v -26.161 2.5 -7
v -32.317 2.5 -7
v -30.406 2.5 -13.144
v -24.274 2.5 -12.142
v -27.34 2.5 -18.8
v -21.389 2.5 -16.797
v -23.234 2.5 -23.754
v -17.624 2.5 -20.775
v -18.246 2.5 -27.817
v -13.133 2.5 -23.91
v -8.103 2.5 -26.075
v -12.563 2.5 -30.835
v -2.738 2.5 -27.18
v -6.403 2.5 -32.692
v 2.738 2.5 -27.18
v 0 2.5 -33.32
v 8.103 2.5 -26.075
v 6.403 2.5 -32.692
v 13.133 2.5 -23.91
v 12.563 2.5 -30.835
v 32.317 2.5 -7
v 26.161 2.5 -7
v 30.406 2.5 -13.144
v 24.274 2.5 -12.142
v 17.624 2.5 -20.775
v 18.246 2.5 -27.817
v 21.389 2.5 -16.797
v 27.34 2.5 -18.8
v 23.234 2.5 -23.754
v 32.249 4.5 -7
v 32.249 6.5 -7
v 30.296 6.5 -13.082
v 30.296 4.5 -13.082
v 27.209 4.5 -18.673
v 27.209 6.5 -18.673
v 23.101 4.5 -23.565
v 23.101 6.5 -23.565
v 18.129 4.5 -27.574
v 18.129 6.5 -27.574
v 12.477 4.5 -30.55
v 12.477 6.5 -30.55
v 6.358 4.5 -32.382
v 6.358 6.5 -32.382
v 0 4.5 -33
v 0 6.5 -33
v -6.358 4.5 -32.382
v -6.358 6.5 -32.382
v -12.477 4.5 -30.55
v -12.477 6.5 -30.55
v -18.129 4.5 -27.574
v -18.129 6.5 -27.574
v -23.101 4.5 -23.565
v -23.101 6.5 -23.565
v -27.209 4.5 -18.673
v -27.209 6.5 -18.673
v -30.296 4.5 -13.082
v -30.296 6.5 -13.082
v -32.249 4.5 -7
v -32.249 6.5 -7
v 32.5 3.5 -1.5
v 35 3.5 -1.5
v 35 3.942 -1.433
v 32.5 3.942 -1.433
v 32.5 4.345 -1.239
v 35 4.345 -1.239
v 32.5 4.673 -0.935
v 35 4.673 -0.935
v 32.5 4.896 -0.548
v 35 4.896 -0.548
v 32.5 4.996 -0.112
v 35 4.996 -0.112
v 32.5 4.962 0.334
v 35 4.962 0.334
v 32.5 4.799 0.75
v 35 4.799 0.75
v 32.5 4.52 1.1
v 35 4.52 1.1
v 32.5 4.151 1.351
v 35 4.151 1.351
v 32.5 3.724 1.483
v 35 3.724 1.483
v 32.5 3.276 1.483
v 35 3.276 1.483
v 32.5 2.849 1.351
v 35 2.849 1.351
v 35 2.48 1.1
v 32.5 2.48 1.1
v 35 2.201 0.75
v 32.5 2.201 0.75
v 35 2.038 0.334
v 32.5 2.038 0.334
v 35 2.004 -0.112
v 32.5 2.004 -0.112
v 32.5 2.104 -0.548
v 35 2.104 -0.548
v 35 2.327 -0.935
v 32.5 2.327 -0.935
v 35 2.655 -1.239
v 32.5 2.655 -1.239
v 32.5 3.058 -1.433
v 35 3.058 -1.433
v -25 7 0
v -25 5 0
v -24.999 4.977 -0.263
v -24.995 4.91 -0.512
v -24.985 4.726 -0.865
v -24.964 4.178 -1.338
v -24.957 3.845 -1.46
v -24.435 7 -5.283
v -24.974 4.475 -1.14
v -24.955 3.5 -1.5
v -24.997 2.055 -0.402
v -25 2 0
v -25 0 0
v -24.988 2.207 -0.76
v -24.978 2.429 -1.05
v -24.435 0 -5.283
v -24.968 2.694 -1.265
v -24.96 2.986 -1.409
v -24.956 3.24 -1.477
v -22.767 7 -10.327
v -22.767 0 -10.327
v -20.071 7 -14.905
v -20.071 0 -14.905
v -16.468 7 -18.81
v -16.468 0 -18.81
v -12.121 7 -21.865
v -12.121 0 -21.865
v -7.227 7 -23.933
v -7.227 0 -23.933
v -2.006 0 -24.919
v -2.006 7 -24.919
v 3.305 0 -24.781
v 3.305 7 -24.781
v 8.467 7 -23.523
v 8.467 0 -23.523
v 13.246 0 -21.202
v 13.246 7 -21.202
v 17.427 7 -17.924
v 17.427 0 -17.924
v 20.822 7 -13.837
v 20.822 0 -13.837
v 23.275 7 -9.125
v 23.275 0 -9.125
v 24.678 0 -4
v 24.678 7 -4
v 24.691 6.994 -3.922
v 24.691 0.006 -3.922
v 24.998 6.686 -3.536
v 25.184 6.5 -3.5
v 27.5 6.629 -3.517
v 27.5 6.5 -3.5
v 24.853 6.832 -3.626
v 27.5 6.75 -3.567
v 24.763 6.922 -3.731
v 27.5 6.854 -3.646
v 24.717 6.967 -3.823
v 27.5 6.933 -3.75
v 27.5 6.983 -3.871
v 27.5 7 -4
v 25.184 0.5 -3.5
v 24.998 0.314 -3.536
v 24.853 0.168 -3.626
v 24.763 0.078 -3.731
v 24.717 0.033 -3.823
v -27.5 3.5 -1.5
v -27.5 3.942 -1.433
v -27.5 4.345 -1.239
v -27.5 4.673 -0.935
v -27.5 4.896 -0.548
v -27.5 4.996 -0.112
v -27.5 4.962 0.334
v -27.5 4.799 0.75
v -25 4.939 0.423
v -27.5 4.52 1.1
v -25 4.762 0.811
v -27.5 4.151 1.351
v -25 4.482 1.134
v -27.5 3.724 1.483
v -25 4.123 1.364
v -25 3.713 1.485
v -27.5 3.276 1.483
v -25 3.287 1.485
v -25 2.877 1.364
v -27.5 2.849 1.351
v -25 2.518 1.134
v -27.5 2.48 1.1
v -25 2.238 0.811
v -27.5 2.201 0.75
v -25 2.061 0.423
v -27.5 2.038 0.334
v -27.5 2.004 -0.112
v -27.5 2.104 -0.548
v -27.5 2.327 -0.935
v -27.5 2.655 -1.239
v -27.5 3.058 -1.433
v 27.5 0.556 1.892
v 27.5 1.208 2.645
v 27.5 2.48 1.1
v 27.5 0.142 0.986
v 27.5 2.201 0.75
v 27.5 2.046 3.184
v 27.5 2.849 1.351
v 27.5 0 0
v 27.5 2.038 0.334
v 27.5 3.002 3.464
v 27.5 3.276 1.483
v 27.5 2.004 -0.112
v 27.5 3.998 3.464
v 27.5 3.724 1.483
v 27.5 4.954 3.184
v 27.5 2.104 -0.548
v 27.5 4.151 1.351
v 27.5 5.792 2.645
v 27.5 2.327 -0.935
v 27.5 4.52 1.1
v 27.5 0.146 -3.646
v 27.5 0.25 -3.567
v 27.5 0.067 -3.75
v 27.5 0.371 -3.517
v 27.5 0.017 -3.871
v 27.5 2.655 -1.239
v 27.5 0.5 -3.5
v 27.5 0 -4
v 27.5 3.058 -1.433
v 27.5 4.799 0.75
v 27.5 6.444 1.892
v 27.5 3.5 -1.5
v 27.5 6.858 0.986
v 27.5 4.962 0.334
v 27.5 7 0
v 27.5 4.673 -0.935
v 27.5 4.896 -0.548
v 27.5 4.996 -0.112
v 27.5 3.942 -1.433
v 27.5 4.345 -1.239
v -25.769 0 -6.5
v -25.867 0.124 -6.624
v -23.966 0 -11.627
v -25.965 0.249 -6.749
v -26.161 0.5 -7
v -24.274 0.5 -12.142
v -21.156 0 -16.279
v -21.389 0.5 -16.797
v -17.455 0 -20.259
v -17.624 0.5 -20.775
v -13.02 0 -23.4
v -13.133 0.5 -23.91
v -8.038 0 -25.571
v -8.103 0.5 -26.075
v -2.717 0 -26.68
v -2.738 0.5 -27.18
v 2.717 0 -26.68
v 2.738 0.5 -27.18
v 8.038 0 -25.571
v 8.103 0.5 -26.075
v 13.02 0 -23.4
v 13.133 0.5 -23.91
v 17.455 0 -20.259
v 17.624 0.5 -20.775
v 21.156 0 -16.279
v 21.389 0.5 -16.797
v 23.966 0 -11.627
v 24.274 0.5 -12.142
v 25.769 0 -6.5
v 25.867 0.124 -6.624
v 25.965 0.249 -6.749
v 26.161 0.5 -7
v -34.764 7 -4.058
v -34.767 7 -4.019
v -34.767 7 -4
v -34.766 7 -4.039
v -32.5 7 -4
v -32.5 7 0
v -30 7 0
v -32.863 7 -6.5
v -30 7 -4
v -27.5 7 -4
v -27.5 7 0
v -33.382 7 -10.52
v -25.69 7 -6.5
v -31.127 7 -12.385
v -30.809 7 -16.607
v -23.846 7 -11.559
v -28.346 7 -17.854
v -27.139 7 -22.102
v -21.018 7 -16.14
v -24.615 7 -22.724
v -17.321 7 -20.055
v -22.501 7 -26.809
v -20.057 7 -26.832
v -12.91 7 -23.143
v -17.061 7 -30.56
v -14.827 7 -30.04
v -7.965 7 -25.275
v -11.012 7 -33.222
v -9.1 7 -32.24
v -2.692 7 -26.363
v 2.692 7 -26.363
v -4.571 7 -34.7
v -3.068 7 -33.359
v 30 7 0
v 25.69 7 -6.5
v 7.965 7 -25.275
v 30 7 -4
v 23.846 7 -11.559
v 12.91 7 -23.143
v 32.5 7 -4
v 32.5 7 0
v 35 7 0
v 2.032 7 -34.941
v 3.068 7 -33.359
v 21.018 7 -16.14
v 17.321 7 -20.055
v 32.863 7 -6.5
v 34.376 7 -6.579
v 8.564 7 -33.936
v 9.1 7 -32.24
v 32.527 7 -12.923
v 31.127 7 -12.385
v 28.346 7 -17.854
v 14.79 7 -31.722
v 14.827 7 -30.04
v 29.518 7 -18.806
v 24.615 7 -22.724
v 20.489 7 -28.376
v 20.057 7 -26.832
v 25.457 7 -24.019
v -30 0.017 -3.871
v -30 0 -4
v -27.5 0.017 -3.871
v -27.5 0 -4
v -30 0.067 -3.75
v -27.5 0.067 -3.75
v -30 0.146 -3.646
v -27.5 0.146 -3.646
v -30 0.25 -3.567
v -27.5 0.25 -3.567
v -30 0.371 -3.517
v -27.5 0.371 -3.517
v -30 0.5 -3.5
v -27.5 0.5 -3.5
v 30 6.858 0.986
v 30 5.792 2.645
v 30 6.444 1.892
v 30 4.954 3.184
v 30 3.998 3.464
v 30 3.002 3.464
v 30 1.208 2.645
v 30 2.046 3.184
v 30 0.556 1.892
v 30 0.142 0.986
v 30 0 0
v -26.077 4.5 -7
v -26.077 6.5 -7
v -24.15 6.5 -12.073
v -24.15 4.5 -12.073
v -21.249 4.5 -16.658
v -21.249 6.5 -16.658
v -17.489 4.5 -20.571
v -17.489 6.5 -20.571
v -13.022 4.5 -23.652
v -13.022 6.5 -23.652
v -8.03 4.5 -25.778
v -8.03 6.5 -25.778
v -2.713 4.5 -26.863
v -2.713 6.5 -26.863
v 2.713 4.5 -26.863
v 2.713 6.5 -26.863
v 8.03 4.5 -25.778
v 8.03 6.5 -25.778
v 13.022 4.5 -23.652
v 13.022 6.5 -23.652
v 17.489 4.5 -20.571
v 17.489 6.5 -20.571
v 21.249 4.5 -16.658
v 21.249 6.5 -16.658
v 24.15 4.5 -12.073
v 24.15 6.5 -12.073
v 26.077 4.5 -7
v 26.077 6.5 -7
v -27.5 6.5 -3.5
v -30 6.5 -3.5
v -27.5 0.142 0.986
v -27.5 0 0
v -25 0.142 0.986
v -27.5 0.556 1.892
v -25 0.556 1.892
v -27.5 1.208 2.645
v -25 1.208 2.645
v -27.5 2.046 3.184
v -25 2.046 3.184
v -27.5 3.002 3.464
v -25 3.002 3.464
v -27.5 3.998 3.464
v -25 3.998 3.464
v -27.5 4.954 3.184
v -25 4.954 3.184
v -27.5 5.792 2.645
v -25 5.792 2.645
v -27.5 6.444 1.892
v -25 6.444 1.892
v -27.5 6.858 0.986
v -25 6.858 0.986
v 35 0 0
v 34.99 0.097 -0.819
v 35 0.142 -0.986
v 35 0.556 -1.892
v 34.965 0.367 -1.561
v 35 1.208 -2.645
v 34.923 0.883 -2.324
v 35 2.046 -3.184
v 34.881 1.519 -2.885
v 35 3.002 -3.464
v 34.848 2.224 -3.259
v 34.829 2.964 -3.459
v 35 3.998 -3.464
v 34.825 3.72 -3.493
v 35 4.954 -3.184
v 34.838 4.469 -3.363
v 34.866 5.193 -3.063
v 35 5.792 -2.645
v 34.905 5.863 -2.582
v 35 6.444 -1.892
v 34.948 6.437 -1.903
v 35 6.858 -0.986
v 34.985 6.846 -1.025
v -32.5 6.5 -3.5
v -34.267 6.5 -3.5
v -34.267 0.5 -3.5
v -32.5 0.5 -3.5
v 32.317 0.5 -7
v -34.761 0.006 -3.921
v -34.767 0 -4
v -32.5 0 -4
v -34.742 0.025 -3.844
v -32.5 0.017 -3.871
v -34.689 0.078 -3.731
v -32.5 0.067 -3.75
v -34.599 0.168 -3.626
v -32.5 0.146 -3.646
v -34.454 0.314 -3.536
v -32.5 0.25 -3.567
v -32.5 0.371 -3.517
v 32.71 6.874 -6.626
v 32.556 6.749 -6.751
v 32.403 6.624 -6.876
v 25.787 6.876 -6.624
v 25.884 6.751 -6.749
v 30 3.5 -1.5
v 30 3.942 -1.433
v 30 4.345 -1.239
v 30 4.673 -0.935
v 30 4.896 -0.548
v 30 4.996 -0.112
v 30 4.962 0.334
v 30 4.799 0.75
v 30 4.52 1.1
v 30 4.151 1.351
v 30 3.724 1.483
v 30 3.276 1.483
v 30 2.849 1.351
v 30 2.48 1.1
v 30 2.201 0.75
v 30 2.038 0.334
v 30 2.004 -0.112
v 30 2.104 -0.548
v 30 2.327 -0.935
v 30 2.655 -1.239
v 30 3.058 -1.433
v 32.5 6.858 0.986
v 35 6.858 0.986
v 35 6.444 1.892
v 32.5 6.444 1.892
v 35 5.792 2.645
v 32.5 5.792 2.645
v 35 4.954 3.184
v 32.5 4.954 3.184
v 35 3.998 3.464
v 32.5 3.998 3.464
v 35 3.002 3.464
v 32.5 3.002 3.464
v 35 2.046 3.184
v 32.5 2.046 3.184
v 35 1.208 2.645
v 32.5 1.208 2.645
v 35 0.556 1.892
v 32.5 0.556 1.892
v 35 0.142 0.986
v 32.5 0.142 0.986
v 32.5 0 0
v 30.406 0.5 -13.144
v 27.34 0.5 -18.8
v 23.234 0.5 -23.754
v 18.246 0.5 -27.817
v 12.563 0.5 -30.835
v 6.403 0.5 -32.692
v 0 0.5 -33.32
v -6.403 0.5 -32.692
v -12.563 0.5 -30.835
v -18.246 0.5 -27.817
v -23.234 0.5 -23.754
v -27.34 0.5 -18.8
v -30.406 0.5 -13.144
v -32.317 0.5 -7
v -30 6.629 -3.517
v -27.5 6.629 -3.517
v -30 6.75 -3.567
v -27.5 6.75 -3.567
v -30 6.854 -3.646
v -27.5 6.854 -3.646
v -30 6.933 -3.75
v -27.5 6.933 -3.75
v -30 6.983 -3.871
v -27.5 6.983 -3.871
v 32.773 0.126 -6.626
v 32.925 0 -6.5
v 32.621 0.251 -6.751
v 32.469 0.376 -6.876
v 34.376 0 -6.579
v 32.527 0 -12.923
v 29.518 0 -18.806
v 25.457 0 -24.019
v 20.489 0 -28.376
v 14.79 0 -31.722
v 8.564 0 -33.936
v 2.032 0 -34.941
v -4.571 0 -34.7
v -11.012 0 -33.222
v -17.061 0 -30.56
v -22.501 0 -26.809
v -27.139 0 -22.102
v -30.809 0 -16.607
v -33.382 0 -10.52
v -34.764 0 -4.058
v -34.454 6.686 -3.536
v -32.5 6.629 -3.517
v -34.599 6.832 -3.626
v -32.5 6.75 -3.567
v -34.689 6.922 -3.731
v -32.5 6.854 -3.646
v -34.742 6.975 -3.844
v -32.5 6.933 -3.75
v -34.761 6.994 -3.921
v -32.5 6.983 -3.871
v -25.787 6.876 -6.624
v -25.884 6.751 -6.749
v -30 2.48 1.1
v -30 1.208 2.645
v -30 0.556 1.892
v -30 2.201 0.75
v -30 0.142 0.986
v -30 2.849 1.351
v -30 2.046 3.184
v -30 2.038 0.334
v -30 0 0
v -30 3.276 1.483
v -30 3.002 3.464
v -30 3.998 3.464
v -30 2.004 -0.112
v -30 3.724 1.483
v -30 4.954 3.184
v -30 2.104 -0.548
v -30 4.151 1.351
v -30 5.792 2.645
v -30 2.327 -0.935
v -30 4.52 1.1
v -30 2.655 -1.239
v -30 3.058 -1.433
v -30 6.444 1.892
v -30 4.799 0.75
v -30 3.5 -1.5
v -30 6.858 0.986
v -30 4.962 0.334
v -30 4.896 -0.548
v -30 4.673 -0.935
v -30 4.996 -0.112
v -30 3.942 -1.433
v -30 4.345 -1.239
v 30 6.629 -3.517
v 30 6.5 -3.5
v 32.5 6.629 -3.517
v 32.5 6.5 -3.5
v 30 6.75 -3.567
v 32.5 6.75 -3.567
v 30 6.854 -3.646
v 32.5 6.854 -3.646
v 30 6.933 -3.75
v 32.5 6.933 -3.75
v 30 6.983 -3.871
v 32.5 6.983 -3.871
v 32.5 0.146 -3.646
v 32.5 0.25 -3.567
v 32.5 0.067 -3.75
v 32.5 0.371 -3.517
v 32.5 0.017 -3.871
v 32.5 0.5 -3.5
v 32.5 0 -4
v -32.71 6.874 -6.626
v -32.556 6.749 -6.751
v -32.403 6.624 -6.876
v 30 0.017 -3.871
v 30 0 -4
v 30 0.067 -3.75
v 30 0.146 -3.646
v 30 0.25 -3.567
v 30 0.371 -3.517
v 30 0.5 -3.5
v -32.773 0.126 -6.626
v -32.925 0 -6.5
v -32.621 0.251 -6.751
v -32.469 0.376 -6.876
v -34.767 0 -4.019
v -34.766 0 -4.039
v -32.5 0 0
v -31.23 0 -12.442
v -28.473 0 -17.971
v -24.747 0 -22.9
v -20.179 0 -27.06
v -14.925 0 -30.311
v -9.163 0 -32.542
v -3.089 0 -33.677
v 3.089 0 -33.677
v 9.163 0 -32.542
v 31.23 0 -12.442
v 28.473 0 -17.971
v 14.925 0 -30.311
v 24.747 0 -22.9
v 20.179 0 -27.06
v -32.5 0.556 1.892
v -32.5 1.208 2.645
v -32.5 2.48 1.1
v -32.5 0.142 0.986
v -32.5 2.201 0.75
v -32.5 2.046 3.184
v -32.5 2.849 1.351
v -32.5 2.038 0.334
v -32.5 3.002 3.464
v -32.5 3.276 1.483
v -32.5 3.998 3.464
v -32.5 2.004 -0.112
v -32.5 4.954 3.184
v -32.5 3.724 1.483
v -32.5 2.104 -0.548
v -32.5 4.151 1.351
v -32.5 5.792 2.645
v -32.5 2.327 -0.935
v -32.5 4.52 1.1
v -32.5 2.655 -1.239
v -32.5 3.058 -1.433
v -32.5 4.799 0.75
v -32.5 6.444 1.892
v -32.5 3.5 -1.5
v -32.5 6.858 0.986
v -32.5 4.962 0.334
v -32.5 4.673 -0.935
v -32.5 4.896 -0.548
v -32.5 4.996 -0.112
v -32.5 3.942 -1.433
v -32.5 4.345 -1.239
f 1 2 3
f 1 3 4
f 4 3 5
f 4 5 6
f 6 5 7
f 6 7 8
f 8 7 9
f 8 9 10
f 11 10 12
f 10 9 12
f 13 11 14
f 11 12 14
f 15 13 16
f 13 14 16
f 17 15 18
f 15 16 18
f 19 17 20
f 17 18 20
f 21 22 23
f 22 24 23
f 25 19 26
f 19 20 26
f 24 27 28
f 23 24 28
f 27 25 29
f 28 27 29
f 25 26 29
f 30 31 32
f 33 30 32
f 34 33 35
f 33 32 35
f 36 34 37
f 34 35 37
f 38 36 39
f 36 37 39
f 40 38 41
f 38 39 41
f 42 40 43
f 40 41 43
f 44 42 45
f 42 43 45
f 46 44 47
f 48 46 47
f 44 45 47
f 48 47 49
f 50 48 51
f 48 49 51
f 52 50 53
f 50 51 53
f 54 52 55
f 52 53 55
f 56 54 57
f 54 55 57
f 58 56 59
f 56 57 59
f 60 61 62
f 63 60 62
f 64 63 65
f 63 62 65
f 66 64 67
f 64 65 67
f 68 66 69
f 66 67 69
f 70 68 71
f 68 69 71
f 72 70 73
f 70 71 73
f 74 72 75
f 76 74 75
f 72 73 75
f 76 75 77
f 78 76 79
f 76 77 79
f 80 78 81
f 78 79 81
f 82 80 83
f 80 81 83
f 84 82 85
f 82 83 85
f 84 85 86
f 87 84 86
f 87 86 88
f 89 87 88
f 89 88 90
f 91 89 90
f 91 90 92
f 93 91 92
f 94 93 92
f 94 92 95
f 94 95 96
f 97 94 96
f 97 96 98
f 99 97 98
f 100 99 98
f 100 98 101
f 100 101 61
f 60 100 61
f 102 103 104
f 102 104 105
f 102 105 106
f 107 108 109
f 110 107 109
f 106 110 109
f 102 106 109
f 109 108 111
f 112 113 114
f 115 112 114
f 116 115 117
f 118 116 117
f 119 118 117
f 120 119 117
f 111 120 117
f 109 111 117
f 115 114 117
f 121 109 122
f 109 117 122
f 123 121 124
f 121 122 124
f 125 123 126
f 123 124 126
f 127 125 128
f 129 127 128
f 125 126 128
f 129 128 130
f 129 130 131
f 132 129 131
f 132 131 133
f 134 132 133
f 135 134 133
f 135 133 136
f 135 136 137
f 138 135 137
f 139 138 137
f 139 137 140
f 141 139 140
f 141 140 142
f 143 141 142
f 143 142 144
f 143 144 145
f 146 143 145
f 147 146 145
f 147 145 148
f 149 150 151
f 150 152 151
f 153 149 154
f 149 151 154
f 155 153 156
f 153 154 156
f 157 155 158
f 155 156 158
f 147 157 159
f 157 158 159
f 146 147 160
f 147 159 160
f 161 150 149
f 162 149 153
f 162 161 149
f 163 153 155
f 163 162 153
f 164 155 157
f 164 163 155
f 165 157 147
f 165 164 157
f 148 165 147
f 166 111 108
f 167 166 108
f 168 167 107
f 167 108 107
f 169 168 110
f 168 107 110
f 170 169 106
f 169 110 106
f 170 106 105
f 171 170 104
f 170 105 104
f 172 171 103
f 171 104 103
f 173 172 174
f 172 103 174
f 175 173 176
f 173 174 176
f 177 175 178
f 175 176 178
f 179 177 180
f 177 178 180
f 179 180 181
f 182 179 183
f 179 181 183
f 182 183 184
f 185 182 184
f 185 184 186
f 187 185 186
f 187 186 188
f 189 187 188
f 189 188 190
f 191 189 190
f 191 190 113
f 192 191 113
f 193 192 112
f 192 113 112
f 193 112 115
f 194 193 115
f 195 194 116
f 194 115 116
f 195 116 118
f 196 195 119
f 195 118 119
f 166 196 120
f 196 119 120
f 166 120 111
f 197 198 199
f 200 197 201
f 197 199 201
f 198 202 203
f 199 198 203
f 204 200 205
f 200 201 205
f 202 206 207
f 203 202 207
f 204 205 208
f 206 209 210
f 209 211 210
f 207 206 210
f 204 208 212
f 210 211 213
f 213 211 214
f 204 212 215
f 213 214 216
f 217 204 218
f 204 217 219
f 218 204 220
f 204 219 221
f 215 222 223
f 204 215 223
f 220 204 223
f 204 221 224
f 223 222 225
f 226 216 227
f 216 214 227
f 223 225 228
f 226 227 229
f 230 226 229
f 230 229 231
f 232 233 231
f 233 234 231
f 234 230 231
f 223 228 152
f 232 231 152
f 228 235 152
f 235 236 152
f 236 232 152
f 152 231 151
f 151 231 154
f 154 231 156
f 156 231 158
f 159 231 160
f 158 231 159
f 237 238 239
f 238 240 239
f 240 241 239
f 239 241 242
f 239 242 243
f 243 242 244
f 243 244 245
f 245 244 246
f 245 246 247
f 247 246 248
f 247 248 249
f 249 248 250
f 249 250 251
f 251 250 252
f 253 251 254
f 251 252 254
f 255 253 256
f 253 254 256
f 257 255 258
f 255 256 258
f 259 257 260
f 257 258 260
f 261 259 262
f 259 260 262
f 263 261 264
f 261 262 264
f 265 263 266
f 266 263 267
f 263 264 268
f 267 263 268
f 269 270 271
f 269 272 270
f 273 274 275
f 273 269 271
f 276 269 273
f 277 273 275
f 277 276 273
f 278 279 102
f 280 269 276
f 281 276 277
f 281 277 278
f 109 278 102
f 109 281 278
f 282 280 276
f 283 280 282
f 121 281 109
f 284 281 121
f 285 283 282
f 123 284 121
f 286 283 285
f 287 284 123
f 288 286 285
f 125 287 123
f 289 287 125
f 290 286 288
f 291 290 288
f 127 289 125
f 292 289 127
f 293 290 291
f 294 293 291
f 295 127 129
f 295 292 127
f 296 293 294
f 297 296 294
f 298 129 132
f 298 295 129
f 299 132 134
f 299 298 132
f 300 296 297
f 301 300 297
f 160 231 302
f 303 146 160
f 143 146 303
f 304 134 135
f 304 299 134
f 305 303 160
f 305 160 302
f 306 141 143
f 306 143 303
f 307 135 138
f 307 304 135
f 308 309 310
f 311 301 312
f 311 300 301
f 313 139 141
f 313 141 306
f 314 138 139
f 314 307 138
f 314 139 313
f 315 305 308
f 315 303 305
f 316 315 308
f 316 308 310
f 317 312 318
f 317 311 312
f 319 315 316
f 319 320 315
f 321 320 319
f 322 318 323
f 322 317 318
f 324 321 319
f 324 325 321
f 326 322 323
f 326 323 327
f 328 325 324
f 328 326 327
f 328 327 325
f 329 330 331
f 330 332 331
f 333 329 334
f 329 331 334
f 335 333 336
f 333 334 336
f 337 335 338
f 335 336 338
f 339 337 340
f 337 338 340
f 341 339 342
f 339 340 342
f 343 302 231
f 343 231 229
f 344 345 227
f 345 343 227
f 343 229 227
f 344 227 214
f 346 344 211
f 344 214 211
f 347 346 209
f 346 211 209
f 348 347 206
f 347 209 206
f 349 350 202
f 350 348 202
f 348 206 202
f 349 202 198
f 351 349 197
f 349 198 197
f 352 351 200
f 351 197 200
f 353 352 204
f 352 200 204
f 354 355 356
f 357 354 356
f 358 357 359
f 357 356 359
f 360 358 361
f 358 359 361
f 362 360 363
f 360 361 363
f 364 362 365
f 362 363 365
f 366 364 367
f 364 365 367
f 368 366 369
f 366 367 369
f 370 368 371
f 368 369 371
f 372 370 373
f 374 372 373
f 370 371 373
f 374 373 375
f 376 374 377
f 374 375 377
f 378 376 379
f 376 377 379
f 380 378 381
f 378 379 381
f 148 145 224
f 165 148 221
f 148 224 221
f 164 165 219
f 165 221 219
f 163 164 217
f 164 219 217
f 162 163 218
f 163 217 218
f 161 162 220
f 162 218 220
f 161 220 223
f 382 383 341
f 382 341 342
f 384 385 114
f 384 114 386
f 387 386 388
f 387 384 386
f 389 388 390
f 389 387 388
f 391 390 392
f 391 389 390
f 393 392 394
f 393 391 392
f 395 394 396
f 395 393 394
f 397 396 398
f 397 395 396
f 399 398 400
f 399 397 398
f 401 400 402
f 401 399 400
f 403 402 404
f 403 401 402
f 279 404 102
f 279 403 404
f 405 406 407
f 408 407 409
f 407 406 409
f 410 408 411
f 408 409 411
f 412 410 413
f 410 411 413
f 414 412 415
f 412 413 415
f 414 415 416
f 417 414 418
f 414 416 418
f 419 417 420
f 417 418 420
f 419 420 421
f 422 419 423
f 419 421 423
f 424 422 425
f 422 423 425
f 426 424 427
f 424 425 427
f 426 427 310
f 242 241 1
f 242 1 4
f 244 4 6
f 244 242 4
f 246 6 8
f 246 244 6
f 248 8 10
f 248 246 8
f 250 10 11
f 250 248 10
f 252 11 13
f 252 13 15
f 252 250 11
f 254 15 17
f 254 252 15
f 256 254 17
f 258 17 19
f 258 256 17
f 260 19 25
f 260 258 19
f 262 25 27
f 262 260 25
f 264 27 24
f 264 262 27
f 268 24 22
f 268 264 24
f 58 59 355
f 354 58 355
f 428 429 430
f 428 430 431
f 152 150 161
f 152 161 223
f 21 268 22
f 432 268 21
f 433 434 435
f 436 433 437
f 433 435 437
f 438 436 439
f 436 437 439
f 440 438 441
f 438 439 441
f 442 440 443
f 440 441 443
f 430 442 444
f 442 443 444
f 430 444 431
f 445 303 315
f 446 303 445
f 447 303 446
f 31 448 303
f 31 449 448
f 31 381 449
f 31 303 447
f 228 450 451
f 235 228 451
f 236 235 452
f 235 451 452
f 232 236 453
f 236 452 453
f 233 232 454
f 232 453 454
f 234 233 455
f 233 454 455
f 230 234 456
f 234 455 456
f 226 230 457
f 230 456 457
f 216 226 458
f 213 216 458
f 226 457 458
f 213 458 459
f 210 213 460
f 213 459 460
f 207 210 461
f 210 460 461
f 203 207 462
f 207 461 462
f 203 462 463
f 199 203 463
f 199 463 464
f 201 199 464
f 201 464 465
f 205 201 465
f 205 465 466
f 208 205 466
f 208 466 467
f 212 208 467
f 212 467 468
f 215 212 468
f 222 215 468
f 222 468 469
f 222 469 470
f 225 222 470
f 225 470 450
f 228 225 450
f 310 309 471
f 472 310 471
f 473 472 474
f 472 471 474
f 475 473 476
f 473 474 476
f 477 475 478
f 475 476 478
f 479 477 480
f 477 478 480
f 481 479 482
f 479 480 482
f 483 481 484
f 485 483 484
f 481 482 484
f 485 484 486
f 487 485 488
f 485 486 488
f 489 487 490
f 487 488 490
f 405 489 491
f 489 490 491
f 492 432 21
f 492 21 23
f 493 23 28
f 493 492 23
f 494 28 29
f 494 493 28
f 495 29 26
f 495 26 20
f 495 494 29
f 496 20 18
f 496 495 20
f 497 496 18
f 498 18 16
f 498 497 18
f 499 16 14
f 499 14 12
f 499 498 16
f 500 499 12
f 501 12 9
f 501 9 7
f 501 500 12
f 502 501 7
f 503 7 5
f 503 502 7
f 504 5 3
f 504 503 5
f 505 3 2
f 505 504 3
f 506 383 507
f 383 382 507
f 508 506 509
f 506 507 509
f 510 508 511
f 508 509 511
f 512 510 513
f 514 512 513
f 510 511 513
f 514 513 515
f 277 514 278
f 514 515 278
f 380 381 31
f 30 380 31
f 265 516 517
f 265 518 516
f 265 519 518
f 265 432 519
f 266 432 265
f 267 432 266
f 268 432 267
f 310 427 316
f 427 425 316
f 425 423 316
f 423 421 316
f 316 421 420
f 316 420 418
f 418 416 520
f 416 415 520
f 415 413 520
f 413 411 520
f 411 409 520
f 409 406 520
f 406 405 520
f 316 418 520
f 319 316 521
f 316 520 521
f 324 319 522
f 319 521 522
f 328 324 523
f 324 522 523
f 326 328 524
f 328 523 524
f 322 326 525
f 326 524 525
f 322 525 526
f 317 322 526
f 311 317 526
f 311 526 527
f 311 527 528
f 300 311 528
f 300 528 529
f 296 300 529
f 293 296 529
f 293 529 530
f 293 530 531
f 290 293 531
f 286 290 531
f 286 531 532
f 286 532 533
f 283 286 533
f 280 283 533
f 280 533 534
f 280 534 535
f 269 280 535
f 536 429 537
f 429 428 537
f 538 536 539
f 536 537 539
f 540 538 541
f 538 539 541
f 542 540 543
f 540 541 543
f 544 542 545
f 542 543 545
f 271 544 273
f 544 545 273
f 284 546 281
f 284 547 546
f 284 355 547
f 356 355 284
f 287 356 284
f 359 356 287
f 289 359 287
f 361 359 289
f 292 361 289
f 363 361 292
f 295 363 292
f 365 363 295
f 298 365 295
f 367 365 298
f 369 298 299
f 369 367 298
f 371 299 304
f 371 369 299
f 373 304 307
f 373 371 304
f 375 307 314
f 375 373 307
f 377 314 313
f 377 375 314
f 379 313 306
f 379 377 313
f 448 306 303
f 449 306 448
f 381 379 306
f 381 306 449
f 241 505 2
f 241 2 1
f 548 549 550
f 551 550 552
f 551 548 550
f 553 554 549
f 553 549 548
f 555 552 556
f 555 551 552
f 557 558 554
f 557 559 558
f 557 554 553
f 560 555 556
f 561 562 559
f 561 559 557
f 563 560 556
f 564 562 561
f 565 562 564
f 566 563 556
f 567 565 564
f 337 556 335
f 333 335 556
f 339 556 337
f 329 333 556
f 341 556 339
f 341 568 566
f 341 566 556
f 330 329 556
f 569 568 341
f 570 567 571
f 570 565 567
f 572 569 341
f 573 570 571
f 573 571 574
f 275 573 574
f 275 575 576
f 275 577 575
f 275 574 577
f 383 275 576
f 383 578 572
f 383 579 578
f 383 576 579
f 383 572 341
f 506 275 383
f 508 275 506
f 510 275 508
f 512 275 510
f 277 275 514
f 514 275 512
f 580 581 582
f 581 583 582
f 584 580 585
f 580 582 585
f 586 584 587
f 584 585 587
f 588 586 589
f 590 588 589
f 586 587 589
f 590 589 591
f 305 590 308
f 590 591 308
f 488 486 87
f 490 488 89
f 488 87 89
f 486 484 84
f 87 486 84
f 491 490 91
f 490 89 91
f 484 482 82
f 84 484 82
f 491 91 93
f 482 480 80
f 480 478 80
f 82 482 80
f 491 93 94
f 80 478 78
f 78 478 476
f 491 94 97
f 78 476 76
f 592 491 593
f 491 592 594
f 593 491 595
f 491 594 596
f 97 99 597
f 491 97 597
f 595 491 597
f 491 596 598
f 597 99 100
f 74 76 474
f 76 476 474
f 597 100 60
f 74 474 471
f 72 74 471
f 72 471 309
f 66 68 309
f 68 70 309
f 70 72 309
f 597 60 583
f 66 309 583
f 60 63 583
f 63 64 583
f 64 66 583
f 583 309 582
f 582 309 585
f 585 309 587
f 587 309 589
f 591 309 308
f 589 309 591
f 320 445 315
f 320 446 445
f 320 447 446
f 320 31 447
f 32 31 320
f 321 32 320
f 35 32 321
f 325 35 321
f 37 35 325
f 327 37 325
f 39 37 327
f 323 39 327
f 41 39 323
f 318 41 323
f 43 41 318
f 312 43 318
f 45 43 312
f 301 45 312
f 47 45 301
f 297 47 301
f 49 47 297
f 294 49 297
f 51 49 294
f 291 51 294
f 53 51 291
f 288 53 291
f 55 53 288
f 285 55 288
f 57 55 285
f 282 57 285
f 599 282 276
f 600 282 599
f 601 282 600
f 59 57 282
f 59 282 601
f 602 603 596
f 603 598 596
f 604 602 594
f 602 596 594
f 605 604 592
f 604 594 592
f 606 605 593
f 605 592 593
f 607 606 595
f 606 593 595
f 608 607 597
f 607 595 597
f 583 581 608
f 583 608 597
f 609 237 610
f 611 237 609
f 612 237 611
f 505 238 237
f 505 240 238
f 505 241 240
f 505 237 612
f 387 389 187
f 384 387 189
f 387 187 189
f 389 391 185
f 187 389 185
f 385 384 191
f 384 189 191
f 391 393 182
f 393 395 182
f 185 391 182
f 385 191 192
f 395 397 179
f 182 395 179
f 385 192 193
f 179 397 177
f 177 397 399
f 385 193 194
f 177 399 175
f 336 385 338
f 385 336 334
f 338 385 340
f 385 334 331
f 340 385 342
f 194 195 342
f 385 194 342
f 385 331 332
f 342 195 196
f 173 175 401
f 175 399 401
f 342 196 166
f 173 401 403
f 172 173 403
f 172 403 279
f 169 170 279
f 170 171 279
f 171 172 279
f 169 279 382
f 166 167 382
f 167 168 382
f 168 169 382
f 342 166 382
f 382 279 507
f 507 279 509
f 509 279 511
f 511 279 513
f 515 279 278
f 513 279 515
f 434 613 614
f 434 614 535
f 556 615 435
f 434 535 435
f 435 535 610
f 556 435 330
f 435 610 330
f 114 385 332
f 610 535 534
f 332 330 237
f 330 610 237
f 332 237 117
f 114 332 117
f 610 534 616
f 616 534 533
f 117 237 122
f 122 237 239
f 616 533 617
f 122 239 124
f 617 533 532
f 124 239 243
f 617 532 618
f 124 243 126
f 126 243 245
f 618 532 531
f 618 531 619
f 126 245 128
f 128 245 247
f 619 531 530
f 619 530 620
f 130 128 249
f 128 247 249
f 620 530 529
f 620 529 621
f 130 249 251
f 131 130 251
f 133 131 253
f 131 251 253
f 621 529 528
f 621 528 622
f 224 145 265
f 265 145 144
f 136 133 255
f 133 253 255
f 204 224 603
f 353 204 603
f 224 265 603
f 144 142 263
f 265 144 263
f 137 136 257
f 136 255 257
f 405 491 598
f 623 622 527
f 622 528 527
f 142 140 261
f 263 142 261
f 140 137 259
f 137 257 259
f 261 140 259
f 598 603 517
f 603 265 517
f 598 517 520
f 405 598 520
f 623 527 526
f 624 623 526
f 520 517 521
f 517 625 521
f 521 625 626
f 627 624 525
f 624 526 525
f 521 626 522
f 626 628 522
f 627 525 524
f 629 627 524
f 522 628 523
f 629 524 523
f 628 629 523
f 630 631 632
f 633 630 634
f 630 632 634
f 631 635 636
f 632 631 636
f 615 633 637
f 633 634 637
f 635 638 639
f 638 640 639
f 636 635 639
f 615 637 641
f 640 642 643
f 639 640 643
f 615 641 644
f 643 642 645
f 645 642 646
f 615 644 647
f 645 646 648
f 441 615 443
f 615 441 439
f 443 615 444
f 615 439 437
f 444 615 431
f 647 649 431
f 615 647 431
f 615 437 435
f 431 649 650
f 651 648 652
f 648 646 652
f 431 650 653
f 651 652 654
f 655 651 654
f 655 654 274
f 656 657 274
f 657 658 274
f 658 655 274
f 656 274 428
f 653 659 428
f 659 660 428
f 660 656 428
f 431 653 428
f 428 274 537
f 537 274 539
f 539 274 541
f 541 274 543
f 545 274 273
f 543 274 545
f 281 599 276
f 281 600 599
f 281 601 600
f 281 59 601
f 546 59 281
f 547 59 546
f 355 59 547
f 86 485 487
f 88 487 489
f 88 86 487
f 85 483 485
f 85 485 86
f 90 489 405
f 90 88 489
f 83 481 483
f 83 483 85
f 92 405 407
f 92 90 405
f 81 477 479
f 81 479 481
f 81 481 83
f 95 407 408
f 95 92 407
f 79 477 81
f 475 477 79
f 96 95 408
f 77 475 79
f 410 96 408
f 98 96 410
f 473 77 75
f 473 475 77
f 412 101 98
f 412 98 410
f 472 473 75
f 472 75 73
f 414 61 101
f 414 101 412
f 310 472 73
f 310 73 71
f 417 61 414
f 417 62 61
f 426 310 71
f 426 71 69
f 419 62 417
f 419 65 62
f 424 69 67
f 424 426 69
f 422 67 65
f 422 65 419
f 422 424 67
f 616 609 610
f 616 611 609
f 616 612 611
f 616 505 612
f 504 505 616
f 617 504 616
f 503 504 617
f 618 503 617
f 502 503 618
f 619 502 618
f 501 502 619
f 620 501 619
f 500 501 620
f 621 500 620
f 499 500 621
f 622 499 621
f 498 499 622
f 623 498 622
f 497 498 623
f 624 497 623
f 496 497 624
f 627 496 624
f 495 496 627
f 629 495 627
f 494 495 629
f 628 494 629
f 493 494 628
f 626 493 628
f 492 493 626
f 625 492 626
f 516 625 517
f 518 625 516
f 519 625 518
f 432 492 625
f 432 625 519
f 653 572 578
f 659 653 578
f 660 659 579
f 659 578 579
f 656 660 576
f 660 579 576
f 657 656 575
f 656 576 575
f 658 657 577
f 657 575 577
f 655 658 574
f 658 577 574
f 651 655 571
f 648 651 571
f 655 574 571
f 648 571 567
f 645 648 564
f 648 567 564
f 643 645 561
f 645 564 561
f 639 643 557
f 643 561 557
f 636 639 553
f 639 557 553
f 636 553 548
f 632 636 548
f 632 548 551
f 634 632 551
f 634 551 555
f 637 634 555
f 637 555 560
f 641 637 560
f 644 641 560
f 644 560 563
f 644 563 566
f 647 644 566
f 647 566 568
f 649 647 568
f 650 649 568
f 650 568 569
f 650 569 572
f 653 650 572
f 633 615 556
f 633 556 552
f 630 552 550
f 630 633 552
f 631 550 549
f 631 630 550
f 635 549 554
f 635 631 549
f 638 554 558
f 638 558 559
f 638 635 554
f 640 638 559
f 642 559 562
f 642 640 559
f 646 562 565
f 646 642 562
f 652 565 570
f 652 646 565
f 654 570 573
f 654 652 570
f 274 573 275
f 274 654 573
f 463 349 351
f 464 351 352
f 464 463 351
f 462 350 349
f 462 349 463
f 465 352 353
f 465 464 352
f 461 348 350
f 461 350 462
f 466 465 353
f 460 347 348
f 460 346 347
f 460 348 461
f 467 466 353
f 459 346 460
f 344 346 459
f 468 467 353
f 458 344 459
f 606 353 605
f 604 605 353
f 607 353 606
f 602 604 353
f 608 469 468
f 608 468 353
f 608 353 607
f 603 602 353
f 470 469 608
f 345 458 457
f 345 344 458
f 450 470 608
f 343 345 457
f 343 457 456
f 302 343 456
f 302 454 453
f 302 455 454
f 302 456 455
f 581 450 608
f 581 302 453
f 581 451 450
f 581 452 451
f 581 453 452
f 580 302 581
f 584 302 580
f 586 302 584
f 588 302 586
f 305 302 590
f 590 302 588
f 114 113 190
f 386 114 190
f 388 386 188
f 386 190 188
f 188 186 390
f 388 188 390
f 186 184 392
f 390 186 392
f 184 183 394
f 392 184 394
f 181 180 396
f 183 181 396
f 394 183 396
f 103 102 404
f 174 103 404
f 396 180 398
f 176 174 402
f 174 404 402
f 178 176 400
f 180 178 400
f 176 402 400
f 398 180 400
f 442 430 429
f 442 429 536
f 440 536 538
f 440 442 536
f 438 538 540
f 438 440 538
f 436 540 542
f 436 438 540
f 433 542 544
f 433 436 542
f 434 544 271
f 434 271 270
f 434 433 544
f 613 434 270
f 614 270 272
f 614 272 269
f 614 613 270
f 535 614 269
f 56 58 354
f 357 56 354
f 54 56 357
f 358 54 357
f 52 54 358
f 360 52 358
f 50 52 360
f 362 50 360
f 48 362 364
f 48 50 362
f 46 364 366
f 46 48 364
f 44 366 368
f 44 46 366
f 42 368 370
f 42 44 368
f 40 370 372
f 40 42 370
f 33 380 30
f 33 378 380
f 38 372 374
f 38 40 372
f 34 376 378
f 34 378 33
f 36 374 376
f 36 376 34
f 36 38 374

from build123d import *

# Parameters (mm, degrees)
EXTRUDE_1_DEPTH          = 7
CUT_EXTRUDE_3_DEPTH      = 2.5
CUT_EXTRUDE_6_DEPTH      = 2.5
CUT_EXTRUDE_6_DEPTH_BACK = 2.5
SKETCH_11_R              = 3.5
EXTRUDE_4_DEPTH          = 10
EXTRUDE_START            = -10
SKETCH_13_R              = 3.5
EXTRUDE_5_DEPTH          = 10
SKETCH_12_W              = 2.5
SKETCH_12_H              = 8.803448755
SKETCH_12_W_2            = 2.746212411
SKETCH_12_H_2            = 8.519621178
CUT_EXTRUDE_10_DEPTH     = 10
CHAMFER_1_SIZE           = 0.5
CHAMFER_2_SIZE           = 0.5
FILLET_1_R               = 0.5
SKETCH_14_R              = 1.5
CUT_EXTRUDE_11_DEPTH     = 123


with BuildPart() as part:
    # Sketch 2 → Extrude 1 (new body)
    with BuildSketch(Plane(origin=(0, 0, 0), x_dir=(1, 0, 0), z_dir=(0, 1, 0))):
        with BuildLine():
            Line((-35, 0), (-25, 0))
            ThreePointArc((-25, 0), (0, 25), (25, 0))
            Line((25, 0), (35, 0))
            ThreePointArc((35, 0), (0, 35), (-35, 0))
        make_face()
    extrude(amount=EXTRUDE_1_DEPTH)

    # Sketch 3 → Cut-Extrude 3 (cut)
    with BuildSketch(Plane(origin=(0, 7, 0), x_dir=(1, 0, 0), z_dir=(0, 1, 0))):
        with BuildLine():
            Line((26.076809621, 7), (32.249030993, 7))
            ThreePointArc((32.249030993, 7), (0, 33), (-32.249030993, 7))
            Line((-32.249030993, 7), (-26.076809621, 7))
            ThreePointArc((-26.076809621, 7), (0, 27), (26.076809621, 7))
        make_face()
    extrude(amount=-CUT_EXTRUDE_3_DEPTH, mode=Mode.SUBTRACT)

    # Sketch 5 → Cut-Extrude 6 (cut, two sides: drawn at the far end of the back side and taken through both)
    with BuildSketch(Plane(origin=(0, 0, 0), x_dir=(1, 0, 0), z_dir=(0, 1, 0)).offset(-CUT_EXTRUDE_6_DEPTH_BACK)):
        with BuildLine():
            Line((26.160532749, 7), (32.316767687, 7))
            ThreePointArc((32.316767687, 7), (0, 33.319691154), (-32.316767687, 7))
            Line((-32.316767687, 7), (-26.160532749, 7))
            ThreePointArc((-26.160532749, 7), (0, 27.319691154), (26.160532749, 7))
        make_face()
    extrude(amount=CUT_EXTRUDE_6_DEPTH + CUT_EXTRUDE_6_DEPTH_BACK, mode=Mode.SUBTRACT)

    # Sketch 11 → Extrude 4 (add)
    with BuildSketch(Plane.ZY.offset(35)):
        with Locations((0, 3.5)):
            Circle(SKETCH_11_R)
    extrude(amount=-EXTRUDE_4_DEPTH)

    # Sketch 13 → Extrude 5 (add)
    with BuildSketch(Plane(origin=(35, 0, 0), x_dir=(0, 0, -1), z_dir=(1, 0, 0)).offset(EXTRUDE_START)):
        with Locations((0, 3.5)):
            Circle(SKETCH_13_R)
    extrude(amount=EXTRUDE_5_DEPTH)

    # Sketch 12 → Cut-Extrude 10 (cut)
    with BuildSketch(Plane(origin=(0, 7, 0), x_dir=(1, 0, 0), z_dir=(0, 1, 0))):
        with Locations((-33.75, -0.901724378)):
            Rectangle(SKETCH_12_W, SKETCH_12_H)
        with Locations((-28.75, -0.901724378)):
            Rectangle(SKETCH_12_W, SKETCH_12_H)
        with Locations((26.126893794, -0.759810589)):
            Rectangle(SKETCH_12_W_2, SKETCH_12_H_2)
        with Locations((31.25, -0.759810589)):
            Rectangle(SKETCH_12_W, SKETCH_12_H_2)
    extrude(amount=-CUT_EXTRUDE_10_DEPTH, mode=Mode.SUBTRACT)

    # Chamfer 1
    chamfer_1_edges = [part.edges().sort_by_distance(p)[0] for p in [
        (0, 7, -33),
        (-29.162920307, 7, -7),
        (0, 7, -27),
        (29.162920307, 7, -7),
    ]]
    chamfer(chamfer_1_edges, length=CHAMFER_1_SIZE)

    # Chamfer 2
    chamfer_2_edges = [part.edges().sort_by_distance(p)[0] for p in [
        (29.238650218, 0, -7),
        (0, 0, -27.319691154),
        (-29.238650218, 0, -7),
        (0, 0, -33.319691154),
    ]]
    chamfer(chamfer_2_edges, length=CHAMFER_2_SIZE)

    # Fillet 1
    fillet_1_edges = [part.edges().sort_by_distance(p)[0] for p in [
        (26.126893794, 0, -3.5),
        (24.753787589, 3.5, -3.5),
        (26.126893794, 7, -3.5),
        (31.25, 0, -3.5),
        (31.25, 7, -3.5),
        (-33.662280149, 0, -3.5),
        (-34.824560299, 3.5, -3.5),
        (-33.662280149, 7, -3.5),
        (-28.75, 0, -3.5),
        (-28.75, 7, -3.5),
    ]]
    fillet(fillet_1_edges, radius=FILLET_1_R)

    # Sketch 14 → Cut-Extrude 11 (cut)
    with BuildSketch(Plane(origin=(35, 0, 0), x_dir=(0, 0, -1), z_dir=(1, 0, 0))):
        with Locations((0, 3.5)):
            Circle(SKETCH_14_R)
    extrude(amount=-CUT_EXTRUDE_11_DEPTH, mode=Mode.SUBTRACT)


solid = part.part
